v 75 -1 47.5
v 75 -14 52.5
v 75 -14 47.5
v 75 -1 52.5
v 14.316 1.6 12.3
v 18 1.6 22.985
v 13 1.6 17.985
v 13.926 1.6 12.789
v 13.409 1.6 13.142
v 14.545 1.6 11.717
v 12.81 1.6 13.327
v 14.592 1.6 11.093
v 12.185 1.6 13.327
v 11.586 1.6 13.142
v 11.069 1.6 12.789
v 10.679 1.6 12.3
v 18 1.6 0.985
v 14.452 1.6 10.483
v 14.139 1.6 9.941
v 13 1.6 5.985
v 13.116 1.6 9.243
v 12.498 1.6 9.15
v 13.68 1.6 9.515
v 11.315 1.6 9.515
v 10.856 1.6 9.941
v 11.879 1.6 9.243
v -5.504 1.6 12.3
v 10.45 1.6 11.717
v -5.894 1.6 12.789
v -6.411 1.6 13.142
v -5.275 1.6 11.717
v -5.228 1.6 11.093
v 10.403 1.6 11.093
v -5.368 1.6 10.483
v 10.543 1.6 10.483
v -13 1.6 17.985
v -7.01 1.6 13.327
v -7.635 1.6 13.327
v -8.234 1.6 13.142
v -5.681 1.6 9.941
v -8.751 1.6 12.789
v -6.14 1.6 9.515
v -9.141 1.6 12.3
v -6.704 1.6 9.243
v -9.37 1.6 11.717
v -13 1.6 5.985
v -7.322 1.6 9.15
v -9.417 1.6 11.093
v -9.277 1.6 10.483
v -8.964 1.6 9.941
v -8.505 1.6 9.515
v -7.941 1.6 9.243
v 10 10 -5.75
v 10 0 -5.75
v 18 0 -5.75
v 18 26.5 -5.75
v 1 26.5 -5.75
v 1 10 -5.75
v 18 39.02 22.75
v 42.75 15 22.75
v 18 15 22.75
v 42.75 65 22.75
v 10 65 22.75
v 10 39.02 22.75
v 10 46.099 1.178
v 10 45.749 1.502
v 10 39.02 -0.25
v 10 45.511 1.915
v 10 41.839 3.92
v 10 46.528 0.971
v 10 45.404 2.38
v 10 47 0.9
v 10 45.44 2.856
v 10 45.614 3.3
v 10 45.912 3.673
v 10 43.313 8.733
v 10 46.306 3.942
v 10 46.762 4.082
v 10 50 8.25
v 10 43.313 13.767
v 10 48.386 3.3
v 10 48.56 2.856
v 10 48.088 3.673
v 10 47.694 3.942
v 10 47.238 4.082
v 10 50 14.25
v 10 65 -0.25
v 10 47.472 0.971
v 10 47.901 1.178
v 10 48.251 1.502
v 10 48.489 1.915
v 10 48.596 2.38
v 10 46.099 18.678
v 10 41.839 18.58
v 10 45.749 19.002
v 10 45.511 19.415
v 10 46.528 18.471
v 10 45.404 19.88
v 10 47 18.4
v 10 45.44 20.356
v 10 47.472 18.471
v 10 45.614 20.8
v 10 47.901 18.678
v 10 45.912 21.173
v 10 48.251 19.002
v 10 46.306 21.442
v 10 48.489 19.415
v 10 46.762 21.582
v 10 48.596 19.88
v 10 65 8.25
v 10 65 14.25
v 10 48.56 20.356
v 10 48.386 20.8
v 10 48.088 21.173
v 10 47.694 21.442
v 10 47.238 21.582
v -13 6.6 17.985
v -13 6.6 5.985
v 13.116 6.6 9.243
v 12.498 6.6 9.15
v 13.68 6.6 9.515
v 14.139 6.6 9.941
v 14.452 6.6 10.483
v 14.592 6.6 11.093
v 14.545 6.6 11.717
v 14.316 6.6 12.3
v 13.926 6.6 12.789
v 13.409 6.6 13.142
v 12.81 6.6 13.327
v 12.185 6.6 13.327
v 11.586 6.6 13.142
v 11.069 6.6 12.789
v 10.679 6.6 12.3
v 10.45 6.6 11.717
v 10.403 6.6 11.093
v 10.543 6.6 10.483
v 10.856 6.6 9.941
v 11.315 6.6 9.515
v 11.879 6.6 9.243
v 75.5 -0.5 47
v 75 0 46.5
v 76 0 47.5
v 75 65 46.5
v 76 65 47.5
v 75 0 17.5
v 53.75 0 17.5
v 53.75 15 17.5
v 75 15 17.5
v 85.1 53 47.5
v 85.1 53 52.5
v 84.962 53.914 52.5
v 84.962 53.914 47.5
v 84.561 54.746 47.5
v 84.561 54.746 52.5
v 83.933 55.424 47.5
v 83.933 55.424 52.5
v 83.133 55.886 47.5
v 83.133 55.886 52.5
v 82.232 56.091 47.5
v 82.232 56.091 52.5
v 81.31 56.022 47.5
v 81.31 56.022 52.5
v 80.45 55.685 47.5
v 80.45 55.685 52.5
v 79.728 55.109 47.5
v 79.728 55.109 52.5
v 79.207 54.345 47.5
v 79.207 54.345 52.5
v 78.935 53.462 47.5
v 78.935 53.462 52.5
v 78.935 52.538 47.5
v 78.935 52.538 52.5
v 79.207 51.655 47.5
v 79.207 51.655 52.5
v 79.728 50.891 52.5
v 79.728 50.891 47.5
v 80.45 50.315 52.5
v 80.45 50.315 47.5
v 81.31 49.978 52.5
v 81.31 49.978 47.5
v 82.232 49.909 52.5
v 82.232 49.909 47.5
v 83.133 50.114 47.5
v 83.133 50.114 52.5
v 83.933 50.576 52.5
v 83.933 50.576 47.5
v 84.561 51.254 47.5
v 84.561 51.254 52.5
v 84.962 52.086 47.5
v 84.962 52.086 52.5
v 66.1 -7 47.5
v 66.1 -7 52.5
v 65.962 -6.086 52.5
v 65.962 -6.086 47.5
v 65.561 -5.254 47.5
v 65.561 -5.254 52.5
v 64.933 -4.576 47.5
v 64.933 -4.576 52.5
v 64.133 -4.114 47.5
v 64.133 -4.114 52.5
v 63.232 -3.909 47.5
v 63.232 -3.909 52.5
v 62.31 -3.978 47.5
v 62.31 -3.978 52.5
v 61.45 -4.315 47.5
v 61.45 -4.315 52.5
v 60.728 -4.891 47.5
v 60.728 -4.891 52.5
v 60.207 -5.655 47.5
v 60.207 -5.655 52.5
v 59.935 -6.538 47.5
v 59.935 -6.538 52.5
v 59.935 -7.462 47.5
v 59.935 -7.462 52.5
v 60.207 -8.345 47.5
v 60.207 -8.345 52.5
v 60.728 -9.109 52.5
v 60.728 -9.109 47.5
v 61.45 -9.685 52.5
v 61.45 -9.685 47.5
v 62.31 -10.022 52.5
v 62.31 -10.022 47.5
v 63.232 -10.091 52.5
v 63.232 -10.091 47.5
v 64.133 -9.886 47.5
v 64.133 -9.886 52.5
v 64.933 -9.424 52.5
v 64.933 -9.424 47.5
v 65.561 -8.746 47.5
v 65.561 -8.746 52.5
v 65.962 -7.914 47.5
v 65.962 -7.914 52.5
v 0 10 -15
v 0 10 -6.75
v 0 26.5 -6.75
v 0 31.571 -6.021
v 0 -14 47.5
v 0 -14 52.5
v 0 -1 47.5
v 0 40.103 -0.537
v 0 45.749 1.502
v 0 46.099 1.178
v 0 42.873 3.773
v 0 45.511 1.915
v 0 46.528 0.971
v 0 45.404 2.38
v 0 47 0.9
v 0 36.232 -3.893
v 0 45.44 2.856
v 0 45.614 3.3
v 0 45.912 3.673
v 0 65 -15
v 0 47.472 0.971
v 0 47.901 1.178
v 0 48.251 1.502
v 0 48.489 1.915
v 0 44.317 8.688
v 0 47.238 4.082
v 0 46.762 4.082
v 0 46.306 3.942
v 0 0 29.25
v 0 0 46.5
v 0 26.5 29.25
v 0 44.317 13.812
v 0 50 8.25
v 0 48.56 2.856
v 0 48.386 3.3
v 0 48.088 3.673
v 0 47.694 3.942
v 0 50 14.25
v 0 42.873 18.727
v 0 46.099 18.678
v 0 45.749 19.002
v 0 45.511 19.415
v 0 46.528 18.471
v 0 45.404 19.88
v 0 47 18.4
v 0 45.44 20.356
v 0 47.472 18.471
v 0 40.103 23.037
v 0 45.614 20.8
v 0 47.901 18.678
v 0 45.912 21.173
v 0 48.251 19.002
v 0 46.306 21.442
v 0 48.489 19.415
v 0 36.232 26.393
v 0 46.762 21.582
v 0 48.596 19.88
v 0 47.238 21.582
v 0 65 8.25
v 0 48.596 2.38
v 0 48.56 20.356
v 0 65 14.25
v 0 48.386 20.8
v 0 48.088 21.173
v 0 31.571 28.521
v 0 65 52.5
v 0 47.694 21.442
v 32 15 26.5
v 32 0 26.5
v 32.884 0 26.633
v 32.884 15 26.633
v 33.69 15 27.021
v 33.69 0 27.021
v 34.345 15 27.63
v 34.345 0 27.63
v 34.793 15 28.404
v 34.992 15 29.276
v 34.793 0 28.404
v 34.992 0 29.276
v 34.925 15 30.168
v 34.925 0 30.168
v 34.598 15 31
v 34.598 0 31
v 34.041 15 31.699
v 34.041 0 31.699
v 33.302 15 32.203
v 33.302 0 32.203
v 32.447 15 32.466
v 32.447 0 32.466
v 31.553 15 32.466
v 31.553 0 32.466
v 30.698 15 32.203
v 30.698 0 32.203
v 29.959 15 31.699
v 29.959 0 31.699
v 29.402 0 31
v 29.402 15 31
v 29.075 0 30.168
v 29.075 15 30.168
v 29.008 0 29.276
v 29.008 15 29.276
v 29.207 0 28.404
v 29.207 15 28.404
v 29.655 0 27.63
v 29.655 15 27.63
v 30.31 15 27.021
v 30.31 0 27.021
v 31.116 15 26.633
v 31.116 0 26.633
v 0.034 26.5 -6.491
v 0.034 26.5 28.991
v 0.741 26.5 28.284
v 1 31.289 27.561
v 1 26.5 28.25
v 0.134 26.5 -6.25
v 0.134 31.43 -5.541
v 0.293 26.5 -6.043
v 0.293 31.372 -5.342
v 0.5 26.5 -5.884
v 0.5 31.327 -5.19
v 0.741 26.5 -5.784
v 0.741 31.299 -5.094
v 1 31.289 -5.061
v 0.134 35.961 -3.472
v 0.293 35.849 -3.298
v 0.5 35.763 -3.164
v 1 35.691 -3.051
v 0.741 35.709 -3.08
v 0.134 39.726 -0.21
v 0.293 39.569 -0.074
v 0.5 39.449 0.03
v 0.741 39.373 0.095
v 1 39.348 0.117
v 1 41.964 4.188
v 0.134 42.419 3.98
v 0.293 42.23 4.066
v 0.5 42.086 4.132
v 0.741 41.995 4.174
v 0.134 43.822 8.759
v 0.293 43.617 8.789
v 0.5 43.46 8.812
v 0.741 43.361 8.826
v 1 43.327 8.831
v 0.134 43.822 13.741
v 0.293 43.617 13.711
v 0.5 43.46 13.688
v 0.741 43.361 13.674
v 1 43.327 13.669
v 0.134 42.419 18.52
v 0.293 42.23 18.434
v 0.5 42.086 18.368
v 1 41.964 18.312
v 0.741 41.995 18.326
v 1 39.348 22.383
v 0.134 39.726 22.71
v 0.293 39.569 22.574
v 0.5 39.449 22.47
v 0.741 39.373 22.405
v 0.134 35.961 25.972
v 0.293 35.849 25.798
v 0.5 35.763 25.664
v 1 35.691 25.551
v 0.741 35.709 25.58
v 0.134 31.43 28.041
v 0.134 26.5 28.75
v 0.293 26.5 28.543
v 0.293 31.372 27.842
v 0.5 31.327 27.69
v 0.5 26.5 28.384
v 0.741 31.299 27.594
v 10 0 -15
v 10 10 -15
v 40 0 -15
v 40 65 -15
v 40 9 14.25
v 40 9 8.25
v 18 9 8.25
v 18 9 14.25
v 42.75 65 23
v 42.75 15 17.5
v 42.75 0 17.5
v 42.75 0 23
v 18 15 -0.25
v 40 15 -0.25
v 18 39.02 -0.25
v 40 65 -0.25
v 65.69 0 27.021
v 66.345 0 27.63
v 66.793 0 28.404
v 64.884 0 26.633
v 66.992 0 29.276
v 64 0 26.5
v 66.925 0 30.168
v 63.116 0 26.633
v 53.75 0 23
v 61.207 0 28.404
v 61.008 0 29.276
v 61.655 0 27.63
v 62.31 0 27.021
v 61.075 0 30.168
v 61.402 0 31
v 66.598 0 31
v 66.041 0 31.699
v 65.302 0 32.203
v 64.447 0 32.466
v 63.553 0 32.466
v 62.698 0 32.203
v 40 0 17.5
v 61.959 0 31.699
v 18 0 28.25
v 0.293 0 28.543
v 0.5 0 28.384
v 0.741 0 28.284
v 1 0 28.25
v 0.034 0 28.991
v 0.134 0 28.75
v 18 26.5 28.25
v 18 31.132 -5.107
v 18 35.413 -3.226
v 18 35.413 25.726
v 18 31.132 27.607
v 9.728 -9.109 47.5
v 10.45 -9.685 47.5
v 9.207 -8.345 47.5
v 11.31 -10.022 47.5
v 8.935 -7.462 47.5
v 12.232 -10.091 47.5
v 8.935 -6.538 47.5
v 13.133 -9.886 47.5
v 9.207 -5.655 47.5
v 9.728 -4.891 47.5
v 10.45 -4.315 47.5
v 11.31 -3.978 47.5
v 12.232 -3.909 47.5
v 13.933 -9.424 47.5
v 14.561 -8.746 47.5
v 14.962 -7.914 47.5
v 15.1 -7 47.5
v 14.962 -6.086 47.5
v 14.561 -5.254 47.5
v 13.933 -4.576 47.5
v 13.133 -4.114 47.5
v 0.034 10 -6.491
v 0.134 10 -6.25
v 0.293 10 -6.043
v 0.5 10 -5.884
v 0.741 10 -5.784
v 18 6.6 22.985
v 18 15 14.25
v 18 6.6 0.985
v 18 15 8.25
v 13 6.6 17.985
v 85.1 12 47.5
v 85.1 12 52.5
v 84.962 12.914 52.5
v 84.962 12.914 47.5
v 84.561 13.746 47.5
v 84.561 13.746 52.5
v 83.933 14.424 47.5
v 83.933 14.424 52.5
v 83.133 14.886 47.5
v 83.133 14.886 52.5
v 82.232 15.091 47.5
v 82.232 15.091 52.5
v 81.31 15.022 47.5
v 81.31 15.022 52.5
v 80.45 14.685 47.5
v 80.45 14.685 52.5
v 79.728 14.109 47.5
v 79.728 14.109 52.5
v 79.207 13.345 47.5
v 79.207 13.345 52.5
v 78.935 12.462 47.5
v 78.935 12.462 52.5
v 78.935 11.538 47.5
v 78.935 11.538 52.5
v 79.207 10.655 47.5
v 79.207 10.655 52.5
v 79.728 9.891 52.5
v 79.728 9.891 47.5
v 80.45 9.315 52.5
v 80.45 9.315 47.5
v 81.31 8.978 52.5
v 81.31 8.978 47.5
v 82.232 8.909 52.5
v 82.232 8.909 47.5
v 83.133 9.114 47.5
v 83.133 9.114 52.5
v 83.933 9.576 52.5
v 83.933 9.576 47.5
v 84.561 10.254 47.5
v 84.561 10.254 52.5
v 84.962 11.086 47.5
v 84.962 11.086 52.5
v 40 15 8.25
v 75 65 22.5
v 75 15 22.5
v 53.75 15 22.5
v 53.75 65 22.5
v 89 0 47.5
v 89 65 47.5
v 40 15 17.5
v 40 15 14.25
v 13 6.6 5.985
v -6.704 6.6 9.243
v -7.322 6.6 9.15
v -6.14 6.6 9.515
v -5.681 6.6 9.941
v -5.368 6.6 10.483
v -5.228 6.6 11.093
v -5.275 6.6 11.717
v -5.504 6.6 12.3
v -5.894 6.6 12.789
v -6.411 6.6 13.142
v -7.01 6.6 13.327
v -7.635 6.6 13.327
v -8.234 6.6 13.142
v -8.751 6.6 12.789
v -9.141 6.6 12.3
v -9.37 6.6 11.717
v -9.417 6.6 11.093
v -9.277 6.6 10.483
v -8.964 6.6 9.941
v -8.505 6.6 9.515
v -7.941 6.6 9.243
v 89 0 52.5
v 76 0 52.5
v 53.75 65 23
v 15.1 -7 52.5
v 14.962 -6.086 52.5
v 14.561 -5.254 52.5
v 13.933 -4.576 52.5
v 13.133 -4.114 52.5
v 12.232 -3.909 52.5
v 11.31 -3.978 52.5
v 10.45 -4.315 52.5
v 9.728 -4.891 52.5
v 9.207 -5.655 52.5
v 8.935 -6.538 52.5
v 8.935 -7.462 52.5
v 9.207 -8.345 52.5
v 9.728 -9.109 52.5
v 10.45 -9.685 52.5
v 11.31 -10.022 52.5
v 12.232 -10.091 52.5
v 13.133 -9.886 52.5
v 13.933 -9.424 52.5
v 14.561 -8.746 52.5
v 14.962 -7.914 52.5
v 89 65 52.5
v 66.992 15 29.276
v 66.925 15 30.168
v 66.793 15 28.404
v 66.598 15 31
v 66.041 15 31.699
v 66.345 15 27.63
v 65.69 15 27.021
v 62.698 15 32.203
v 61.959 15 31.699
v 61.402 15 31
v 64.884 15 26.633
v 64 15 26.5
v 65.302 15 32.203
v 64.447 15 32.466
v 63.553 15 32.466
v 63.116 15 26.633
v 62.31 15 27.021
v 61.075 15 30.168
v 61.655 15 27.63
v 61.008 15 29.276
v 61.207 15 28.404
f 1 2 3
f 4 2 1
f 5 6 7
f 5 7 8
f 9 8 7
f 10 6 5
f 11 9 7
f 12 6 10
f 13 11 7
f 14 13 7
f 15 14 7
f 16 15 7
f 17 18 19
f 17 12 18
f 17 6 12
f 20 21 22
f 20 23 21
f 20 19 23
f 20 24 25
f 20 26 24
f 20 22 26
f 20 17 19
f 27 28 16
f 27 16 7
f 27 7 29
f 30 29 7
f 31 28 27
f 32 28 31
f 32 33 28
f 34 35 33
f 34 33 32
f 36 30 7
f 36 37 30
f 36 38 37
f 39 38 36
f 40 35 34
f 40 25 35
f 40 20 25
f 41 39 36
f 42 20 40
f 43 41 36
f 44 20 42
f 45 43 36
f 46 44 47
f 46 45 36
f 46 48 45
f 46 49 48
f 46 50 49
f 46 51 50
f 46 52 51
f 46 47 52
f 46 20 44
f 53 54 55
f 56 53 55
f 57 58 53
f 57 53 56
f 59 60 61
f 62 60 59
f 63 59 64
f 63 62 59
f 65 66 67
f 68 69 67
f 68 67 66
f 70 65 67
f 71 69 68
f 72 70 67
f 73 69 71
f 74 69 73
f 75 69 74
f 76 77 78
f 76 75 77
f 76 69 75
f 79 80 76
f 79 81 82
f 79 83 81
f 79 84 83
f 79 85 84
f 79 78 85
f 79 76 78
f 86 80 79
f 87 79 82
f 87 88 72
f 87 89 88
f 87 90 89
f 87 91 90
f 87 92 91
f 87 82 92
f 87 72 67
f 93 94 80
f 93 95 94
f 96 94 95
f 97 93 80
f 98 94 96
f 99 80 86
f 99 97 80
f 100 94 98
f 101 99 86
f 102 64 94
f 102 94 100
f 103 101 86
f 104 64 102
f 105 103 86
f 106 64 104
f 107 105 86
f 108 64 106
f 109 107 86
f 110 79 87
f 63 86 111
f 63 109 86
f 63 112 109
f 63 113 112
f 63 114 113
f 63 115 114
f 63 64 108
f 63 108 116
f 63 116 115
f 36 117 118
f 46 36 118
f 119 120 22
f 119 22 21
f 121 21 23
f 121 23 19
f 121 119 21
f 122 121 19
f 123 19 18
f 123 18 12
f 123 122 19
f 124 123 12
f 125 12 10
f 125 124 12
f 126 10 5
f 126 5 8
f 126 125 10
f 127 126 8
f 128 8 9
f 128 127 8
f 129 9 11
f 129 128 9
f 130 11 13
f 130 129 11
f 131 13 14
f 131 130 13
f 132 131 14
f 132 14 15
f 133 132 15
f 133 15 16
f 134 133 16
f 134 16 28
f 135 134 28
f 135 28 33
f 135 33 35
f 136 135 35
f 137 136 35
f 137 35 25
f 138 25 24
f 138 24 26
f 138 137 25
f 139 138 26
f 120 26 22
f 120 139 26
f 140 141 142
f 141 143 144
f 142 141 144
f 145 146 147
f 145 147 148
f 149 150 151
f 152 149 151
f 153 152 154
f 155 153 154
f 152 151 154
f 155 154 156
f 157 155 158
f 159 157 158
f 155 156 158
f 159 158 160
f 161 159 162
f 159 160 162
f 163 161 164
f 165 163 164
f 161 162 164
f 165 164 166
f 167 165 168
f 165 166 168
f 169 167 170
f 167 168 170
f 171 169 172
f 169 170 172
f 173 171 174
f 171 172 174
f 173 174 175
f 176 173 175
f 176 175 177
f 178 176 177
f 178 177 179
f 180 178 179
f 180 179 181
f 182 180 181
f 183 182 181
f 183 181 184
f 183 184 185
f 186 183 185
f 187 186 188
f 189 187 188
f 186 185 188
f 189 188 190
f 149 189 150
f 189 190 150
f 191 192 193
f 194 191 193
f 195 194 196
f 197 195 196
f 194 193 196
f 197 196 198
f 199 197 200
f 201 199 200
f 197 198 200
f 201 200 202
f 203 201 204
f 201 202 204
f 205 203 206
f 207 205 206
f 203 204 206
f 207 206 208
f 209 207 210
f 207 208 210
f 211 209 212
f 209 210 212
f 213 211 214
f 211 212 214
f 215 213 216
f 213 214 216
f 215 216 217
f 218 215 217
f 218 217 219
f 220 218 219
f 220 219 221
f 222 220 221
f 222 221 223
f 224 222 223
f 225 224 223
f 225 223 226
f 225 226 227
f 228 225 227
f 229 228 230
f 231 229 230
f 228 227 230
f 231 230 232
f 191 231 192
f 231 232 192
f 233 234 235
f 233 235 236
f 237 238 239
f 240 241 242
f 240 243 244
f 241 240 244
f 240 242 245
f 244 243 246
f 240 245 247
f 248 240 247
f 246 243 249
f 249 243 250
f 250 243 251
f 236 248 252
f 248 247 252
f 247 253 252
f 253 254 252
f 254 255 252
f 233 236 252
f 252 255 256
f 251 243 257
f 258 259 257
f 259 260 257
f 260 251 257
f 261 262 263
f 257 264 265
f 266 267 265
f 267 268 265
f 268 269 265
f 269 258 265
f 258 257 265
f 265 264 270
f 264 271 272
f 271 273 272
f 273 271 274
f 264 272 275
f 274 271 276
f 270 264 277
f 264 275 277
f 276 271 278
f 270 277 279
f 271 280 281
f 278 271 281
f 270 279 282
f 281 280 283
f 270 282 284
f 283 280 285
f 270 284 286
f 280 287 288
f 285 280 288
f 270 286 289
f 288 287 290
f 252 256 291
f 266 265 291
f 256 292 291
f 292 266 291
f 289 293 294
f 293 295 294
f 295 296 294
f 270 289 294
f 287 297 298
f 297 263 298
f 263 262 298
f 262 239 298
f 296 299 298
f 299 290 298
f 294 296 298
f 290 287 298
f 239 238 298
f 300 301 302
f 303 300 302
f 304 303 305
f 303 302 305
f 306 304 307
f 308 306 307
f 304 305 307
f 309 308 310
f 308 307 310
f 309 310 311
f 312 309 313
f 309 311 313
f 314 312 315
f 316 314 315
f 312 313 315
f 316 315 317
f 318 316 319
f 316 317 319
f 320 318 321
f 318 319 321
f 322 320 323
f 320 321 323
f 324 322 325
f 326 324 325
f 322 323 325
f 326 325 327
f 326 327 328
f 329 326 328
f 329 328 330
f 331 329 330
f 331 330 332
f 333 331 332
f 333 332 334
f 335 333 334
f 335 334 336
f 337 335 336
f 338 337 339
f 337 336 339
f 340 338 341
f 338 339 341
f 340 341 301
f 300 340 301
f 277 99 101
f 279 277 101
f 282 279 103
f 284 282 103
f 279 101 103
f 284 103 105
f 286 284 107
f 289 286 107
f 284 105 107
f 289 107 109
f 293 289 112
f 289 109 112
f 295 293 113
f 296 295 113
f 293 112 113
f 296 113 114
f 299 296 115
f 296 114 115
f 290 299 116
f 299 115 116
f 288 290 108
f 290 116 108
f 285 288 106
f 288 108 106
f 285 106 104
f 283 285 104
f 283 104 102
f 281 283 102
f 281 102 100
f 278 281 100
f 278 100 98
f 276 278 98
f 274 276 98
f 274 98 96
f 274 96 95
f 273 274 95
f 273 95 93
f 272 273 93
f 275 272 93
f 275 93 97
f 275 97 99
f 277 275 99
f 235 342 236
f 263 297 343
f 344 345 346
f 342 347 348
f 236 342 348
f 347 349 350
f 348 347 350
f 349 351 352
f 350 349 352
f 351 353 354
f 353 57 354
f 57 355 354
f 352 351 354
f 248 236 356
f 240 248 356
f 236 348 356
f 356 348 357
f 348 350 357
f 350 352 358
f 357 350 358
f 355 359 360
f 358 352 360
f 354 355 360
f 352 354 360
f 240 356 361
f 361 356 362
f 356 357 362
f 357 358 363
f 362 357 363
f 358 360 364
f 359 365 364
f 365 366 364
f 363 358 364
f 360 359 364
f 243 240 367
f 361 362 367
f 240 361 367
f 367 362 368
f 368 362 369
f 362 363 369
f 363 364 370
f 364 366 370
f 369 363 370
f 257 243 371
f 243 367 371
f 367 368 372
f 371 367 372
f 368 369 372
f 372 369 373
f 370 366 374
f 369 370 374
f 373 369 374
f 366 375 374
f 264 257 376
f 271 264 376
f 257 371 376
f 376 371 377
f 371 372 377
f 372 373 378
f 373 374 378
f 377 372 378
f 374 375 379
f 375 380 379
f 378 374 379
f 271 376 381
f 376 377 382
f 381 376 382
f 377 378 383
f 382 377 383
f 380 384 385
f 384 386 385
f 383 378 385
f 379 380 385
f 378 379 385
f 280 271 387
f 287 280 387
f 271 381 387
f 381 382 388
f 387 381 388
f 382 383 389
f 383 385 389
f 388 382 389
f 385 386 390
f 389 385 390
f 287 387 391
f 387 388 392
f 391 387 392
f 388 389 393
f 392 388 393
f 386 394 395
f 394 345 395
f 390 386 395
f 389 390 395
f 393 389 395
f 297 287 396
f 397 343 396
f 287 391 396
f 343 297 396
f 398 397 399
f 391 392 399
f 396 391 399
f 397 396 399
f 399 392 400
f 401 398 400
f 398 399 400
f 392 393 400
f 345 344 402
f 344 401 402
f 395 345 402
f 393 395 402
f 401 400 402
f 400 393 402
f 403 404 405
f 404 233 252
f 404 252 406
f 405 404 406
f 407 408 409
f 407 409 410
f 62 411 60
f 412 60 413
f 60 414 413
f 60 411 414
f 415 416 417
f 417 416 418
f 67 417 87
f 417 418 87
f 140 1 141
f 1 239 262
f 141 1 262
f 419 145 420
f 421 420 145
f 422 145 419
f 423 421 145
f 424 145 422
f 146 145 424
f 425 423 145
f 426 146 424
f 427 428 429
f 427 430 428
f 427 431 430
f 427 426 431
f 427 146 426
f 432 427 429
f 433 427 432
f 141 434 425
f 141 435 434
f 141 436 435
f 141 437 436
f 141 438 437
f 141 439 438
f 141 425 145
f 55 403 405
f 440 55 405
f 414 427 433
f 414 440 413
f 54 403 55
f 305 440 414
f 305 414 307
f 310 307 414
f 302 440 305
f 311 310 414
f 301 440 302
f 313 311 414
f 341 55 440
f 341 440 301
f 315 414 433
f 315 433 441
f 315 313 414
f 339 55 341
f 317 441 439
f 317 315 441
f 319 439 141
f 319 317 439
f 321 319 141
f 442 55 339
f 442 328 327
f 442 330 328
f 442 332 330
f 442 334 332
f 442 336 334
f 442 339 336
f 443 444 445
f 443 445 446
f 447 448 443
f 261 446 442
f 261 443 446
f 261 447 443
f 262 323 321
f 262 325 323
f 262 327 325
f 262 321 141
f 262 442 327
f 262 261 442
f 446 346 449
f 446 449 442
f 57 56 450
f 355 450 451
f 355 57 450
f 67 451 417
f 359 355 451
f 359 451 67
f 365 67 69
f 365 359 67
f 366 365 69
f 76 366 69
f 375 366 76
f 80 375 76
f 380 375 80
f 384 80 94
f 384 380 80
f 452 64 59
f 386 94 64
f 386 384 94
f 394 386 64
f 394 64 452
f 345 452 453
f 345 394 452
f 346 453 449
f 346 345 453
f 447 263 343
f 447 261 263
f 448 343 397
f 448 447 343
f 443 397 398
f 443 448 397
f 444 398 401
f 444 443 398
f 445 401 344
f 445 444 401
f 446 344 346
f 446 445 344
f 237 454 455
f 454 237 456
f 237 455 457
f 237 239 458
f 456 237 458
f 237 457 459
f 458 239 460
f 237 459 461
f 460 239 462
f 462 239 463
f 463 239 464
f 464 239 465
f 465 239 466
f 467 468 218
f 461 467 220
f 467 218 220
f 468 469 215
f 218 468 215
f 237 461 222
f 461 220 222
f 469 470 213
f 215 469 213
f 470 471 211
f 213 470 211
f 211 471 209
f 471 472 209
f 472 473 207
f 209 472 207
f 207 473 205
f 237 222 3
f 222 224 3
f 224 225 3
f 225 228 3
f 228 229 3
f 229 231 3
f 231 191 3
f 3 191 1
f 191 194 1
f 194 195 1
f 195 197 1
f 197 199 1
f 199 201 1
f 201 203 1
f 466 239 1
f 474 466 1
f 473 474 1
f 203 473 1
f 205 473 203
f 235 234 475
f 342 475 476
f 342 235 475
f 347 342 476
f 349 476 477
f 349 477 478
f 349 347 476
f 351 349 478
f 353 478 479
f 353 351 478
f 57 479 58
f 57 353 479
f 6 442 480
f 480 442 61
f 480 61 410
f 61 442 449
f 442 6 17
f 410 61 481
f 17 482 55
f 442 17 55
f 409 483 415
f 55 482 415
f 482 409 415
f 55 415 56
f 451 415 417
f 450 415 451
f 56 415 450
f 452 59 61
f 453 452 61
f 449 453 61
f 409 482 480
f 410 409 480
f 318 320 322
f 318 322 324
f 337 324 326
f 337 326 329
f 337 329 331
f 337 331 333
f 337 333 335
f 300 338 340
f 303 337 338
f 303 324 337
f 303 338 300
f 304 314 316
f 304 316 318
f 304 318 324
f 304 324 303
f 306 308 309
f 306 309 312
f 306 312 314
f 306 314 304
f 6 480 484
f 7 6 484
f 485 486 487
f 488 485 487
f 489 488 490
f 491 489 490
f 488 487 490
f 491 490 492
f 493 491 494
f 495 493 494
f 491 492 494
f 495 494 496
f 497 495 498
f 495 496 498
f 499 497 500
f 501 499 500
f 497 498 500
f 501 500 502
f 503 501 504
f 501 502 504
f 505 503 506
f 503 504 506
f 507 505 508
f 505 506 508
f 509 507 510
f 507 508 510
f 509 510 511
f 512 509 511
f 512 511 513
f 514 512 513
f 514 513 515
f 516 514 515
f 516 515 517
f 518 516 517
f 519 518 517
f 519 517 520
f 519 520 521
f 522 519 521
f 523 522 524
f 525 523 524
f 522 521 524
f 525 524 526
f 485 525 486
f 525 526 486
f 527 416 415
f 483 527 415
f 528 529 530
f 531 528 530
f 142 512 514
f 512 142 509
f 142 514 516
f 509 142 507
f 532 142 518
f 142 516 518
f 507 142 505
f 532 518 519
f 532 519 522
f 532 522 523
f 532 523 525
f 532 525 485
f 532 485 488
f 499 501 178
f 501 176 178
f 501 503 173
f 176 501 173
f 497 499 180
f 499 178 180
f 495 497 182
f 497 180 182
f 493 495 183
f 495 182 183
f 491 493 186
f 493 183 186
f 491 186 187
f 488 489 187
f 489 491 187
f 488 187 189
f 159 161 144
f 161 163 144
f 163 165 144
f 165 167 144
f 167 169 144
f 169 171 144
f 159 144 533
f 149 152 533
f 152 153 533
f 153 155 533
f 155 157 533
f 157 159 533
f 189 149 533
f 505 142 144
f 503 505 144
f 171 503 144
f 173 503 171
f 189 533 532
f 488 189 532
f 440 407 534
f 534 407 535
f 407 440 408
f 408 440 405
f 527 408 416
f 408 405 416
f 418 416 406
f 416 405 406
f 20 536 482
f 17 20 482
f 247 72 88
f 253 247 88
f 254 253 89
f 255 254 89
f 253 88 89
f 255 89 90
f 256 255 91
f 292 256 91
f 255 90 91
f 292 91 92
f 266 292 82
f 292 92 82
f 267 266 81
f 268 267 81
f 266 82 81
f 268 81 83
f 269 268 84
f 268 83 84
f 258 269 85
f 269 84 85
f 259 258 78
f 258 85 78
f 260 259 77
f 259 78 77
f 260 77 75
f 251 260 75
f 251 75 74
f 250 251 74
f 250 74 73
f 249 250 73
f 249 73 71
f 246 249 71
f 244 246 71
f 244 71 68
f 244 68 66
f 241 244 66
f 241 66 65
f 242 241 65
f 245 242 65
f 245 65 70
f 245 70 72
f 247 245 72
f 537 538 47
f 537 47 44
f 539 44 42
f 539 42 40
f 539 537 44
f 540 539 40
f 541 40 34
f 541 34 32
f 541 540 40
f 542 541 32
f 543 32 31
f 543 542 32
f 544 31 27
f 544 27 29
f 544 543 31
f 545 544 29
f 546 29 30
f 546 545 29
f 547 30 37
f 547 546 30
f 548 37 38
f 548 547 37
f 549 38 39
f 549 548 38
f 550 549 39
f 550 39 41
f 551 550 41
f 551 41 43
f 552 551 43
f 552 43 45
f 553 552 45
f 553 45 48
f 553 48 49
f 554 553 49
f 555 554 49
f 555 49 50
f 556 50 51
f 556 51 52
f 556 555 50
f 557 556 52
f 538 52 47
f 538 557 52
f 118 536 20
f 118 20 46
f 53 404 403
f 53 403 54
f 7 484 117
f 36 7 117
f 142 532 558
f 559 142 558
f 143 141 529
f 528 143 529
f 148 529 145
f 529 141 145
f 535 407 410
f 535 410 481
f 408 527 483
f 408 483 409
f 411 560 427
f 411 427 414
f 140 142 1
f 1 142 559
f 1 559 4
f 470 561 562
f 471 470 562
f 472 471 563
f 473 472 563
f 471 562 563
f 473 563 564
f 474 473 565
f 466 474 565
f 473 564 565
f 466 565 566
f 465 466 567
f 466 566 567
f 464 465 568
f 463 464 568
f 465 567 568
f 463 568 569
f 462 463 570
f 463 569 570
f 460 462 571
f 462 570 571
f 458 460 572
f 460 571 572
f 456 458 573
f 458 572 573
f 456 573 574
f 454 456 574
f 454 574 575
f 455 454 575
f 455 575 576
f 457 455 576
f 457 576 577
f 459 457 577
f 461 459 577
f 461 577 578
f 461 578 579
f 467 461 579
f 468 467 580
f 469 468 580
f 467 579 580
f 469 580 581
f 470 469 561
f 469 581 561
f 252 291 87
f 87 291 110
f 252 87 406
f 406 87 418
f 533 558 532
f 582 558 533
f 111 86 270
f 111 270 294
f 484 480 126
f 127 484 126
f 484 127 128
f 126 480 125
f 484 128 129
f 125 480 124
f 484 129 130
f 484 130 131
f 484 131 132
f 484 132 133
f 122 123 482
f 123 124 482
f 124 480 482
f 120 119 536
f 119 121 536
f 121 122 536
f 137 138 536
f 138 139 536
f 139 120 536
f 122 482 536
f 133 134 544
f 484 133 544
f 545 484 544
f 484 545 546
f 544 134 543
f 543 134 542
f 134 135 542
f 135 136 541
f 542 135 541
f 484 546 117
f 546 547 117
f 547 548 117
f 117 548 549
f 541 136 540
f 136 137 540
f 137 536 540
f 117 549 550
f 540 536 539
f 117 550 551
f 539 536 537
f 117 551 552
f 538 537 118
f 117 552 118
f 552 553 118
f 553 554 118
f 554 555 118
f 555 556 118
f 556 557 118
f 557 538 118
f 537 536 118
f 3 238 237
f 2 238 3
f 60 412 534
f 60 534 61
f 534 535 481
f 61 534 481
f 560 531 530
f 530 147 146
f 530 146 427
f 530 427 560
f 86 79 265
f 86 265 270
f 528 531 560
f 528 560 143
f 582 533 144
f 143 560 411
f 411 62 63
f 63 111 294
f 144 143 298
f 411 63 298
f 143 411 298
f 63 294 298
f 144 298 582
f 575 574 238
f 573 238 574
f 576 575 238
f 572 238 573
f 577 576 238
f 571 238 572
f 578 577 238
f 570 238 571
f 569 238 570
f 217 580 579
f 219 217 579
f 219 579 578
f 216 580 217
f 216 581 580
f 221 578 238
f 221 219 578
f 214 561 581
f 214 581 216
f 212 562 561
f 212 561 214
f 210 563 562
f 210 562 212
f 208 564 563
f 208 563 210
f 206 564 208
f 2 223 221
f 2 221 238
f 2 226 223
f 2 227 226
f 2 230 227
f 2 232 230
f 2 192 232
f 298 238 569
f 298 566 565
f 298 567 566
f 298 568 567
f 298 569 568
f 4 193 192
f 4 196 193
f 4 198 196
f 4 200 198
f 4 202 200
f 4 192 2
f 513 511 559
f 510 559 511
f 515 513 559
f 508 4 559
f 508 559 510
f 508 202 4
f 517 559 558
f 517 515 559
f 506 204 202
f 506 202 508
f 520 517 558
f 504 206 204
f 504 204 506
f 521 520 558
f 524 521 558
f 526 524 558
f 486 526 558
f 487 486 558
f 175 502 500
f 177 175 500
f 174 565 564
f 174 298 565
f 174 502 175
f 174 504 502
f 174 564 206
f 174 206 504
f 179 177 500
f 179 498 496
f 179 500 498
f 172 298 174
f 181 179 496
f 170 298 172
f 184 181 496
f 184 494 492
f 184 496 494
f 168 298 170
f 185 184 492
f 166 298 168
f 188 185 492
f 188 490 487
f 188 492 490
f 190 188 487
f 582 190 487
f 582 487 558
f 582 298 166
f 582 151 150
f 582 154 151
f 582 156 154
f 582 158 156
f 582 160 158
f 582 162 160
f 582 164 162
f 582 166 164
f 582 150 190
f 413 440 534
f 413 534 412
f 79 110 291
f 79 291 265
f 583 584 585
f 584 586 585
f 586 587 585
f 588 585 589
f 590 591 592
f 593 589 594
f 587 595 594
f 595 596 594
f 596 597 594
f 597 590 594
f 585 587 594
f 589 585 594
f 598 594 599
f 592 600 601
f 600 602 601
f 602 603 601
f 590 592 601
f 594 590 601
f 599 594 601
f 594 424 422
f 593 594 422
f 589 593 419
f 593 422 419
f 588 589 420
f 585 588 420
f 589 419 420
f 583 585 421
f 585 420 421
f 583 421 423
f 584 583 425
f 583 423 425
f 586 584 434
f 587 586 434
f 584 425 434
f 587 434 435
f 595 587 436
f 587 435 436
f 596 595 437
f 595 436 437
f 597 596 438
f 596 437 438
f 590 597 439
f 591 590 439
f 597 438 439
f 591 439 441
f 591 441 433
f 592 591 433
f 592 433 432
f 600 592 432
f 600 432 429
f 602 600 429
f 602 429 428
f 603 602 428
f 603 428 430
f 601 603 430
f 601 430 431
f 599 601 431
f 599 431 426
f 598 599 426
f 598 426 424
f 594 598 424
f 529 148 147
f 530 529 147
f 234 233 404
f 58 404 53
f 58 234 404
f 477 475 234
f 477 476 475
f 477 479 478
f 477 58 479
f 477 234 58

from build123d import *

# Parameters (mm, degrees)
BOSS_EXTRUDE1_DEPTH      = 42.5
BOSS_EXTRUDE1_DEPTH_BACK = 15
SKETCH1_W                = 40
SKETCH1_H                = 65
SKETCH3_W                = 22.5
SKETCH3_H                = 50
CUT_EXTRUDE2_DEPTH       = 30
SKETCH4_R                = 4.5
CUT_EXTRUDE3_DEPTH       = 10
SKETCH5_W                = 35
SKETCH5_H                = 25
BOSS_EXTRUDE3_DEPTH      = 15
SKETCH6_R                = 3
CUT_EXTRUDE4_DEPTH       = 15
CUT_EXTRUDE5_DEPTH       = 108.964114408
BOSS_EXTRUDE4_DEPTH      = 10
BOSS_EXTRUDE5_OUTLINE_R  = 3
BOSS_EXTRUDE5_DEPTH      = 50
BOSS_EXTRUDE6_START      = -50
SKETCH11_R               = 3
BOSS_EXTRUDE6_DEPTH      = 50
SKETCH12_W               = 14
SKETCH12_H               = 65
SKETCH12_R               = 3.1
SKETCH12_W_2             = 75
SKETCH12_H_2             = 14
BOSS_EXTRUDE7_DEPTH      = 5
SKETCH13_R               = 1.6
CUT_EXTRUDE6_DEPTH       = 115.988042857
CUT_EXTRUDE7_DEPTH       = 11.5
CUT_EXTRUDE7_DEPTH_BACK  = 11.5
SKETCH14_W               = 43.75
SKETCH14_H               = 50
CUT_EXTRUDE8_DEPTH       = 30
CUT_EXTRUDE9_DEPTH       = 115.988042857
CUT_EXTRUDE10_DEPTH      = 18
SKETCH18_W               = 31
SKETCH18_H               = 12
SKETCH18_R               = 2.1
BOSS_EXTRUDE8_DEPTH      = 5
FILLET2_R                = 1
SKETCH19_W               = 9.25
SKETCH19_H               = 10
CUT_EXTRUDE11_DEPTH      = 10
CHAMFER1_SIZE            = 1
CHAMFER2_SIZE            = 1


# Read off the part's stored shape, not the designer's step: Boss-Extrude5
# Some blends are built 0.0001 mm under size
with BuildPart() as part:
    # Sketch1 → Boss-Extrude1 (new, two sides: drawn at the far end of the back side and taken through both)
    with BuildSketch(Plane.XY.offset(-BOSS_EXTRUDE1_DEPTH_BACK)):
        with Locations((20, 32.5)):
            Rectangle(SKETCH1_W, SKETCH1_H)
    extrude(amount=BOSS_EXTRUDE1_DEPTH + BOSS_EXTRUDE1_DEPTH_BACK)

    # Sketch3 → Cut-Extrude2 (cut)
    with BuildSketch(Plane(origin=(40, 0, 0), x_dir=(0, 0, -1), z_dir=(1, 0, 0))):
        with Locations((-11.25, 40)):
            Rectangle(SKETCH3_W, SKETCH3_H)
    extrude(amount=-CUT_EXTRUDE2_DEPTH, mode=Mode.SUBTRACT)

    # Sketch4 → Cut-Extrude3 (cut)
    with BuildSketch(Plane(origin=(10, 0, 0), x_dir=(0, 0, -1), z_dir=(1, 0, 0))):
        with Locations((-11.25, 26.5)):
            Circle(SKETCH4_R)
    extrude(amount=-CUT_EXTRUDE3_DEPTH, mode=Mode.SUBTRACT)

    # Sketch5 → Boss-Extrude3 (add)
    with BuildSketch(Plane.XZ):
        with Locations((57.5, 30)):
            Rectangle(SKETCH5_W, SKETCH5_H)
    extrude(amount=-BOSS_EXTRUDE3_DEPTH)

    # Sketch6 → Cut-Extrude4 (cut)
    with BuildSketch(Plane.XZ):
        with Locations(Location((32, 29.5, 0), (0, 0, 270))):
            Circle(SKETCH6_R)
        with Locations(Location((64, 29.5, 0), (0, 0, 270))):
            Circle(SKETCH6_R)
    extrude(amount=-CUT_EXTRUDE4_DEPTH, mode=Mode.SUBTRACT)

    # Sketch8 → Cut-Extrude5 (cut, through all)
    with BuildSketch(Plane.XZ):
        Polygon((48.25, 17.5), (42.75, 17.5), (42.75, 23), (53.75, 23), (53.75, 17.5), align=None)
    extrude(amount=-CUT_EXTRUDE5_DEPTH, mode=Mode.SUBTRACT)

    # Sketch9 → Boss-Extrude4 (add)
    with BuildSketch(Plane.XY.offset(42.5)):
        Polygon((0, 65), (0, 0), (75, 0), (75, 15), (40, 15), (40, 65), align=None)
    extrude(amount=BOSS_EXTRUDE4_DEPTH)

    # Boss-Extrude5 outline → Boss-Extrude5 (add)
    with BuildSketch(Plane(origin=(0, 15, 0), x_dir=(1, 0, 0), z_dir=(0, 1, 0))):
        Polygon((75, -52.5), (75, -22.5), (53.75, -22.5), (53.75, -23), (42.75, -23), (42.75, -22.5), (40, -22.5), (40, -52.5), align=None)
        with Locations((64, -29.5)):
            Circle(BOSS_EXTRUDE5_OUTLINE_R, mode=Mode.SUBTRACT)
    extrude(amount=BOSS_EXTRUDE5_DEPTH)

    # Sketch11 → Boss-Extrude6 (add)
    with BuildSketch(Plane(origin=(0, 65, 0), x_dir=(1, 0, 0), z_dir=(0, 1, 0)).offset(BOSS_EXTRUDE6_START)):
        with Locations(Location((64, -29.5, 0), (0, 0, 90))):
            Circle(SKETCH11_R)
    extrude(amount=BOSS_EXTRUDE6_DEPTH)

    # Sketch12 → Boss-Extrude7 (add)
    # profile 1 of 2: a face of its own
    with BuildSketch(Plane.XY.offset(52.5)):
        with Locations((82, 32.5)):
            Rectangle(SKETCH12_W, SKETCH12_H)
        with Locations((82, 53)):
            Circle(SKETCH12_R, mode=Mode.SUBTRACT)
        with Locations((82, 12)):
            Circle(SKETCH12_R, mode=Mode.SUBTRACT)
    # profile 2 of 2: a face of its own
    with BuildSketch(Plane.XY.offset(52.5)):
        with Locations((37.5, -7)):
            Rectangle(SKETCH12_W_2, SKETCH12_H_2)
        with Locations((12, -7)):
            Circle(SKETCH12_R, mode=Mode.SUBTRACT)
        with Locations((63, -7)):
            Circle(SKETCH12_R, mode=Mode.SUBTRACT)
    extrude(amount=-BOSS_EXTRUDE7_DEPTH)

    # Sketch13 → Cut-Extrude6 (cut, through all)
    with BuildSketch(Plane(origin=(10, 0, 0), x_dir=(0, 0, -1), z_dir=(1, 0, 0))):
        with Locations((-2.5, 47)):
            Circle(SKETCH13_R)
        with Locations((-20, 47)):
            Circle(SKETCH13_R)
    extrude(amount=-CUT_EXTRUDE6_DEPTH, mode=Mode.SUBTRACT)

    # Sketch14 → Cut-Extrude7 (cut, two sides: drawn at the far end of the back side and taken through both)
    with BuildSketch(Plane(origin=(0, 0, 11.25), x_dir=(-1, 0, 0), z_dir=(0, 0, -1)).offset(-CUT_EXTRUDE7_DEPTH_BACK)):
        with Locations((-31.875, 40)):
            Rectangle(SKETCH14_W, SKETCH14_H)
    extrude(amount=CUT_EXTRUDE7_DEPTH + CUT_EXTRUDE7_DEPTH_BACK, mode=Mode.SUBTRACT)

    # Sketch15 → Cut-Extrude8 (cut)
    with BuildSketch(Plane(origin=(40, 0, 0), x_dir=(0, 0, -1), z_dir=(1, 0, 0))):
        Polygon((-11.25, 15), (-8.25, 15), (-8.25, 9), (-14.25, 9), (-14.25, 15), align=None)
    extrude(amount=-CUT_EXTRUDE8_DEPTH, mode=Mode.SUBTRACT)

    # Sketch16 → Cut-Extrude9 (cut, through all)
    with BuildSketch(Plane(origin=(10, 0, 0), x_dir=(0, 0, -1), z_dir=(1, 0, 0))):
        Polygon((-11.25, 65), (-8.25, 65), (-8.25, 50), (-14.25, 50), (-14.25, 65), align=None)
    extrude(amount=-CUT_EXTRUDE9_DEPTH, mode=Mode.SUBTRACT)

    # Sketch17 → Cut-Extrude10 (cut)
    with BuildSketch(Plane.ZY):
        with BuildLine():
            Line((28.25, 26.5), (28.25, 0))
            Line((28.25, 0), (-5.75, 0))
            Line((-5.75, 0), (-5.75, 26.5))
            ThreePointArc((-5.75, 26.5), (11.25, 43.5), (28.25, 26.5))
        make_face()
    extrude(amount=-CUT_EXTRUDE10_DEPTH, mode=Mode.SUBTRACT)

    # Sketch18 → Boss-Extrude8 (add)
    # profile 1 of 3: a face of its own
    with BuildSketch(Plane(origin=(78.326188017, 6.6, -27.619079409), x_dir=(-1, 0, 0), z_dir=(0, -1, 0))):
        Polygon((60.326188017, -28.604062705), (60.326188017, -33.604062705), (65.326188017, -33.604062705), align=None)
    # profile 2 of 3: a face of its own
    with BuildSketch(Plane(origin=(78.326188017, 6.6, -27.619079409), x_dir=(-1, 0, 0), z_dir=(0, -1, 0))):
        Polygon((65.326188017, -45.604062705), (60.326188017, -45.604062705), (60.326188017, -50.604062705), align=None)
    # profile 3 of 3: a face of its own
    with BuildSketch(Plane(origin=(78.326188017, 6.6, -27.619079409), x_dir=(-1, 0, 0), z_dir=(0, -1, 0))):
        with Locations((75.826188017, -39.604062705)):
            Rectangle(SKETCH18_W, SKETCH18_H)
        with Locations(Location((85.648688017, -38.869079409, 0), (0, 0, 90))):
            Circle(SKETCH18_R, mode=Mode.SUBTRACT)
        with Locations(Location((65.828688017, -38.869079409, 0), (0, 0, 90))):
            Circle(SKETCH18_R, mode=Mode.SUBTRACT)
    extrude(amount=BOSS_EXTRUDE8_DEPTH)

    # Fillet2
    fillet2_edges = [part.edges().sort_by_distance(p)[0] for p in [
        (0, 43.5, 11.25),
        (0, 13.25, -5.75),
        (0, 13.25, 28.25),
    ]]
    fillet(fillet2_edges, radius=FILLET2_R)

    # Sketch19 → Cut-Extrude11 (cut)
    with BuildSketch(Plane.ZY):
        with Locations((-10.375, 5)):
            Rectangle(SKETCH19_W, SKETCH19_H)
    extrude(amount=-CUT_EXTRUDE11_DEPTH, mode=Mode.SUBTRACT)

    # Chamfer1
    # the kernel refuses this chamfer: 1 mm, written as the material it adds along each edge
    with BuildSketch(Plane(origin=(75, 0, 47.5), x_dir=(-0.027495876610582105, 0, -0.999621916911297), z_dir=(0, 1, 0))) as chamfer1_piece_1:
        Polygon((CHAMFER1_SIZE * 0.999621916911, -CHAMFER1_SIZE * 0.0274958766106), (-CHAMFER1_SIZE * 0.0274958766106, -CHAMFER1_SIZE * 0.999621916911), (0, 0), align=None)
    extrude(amount=65)

    # Chamfer2
    chamfer2_edges = [part.edges().sort_by_distance(p)[0] for p in [
        (37.5, 0, 47.5),
    ]]
    chamfer(chamfer2_edges, length=CHAMFER2_SIZE - 0.0001)  # a hair under: the kernel refuses the full size

    # Chamfer3
    # the kernel refuses this chamfer: 1 mm, written as the material it adds along each edge
    with BuildSketch(Plane(origin=(75, 0, 52.5), x_dir=(0.9996219169112968, 0.02749587661058591, 0), z_dir=(0, 0, -1))) as chamfer3_piece_1_section:
        with BuildLine():
            Line((1.028673195, 0), (-0.056547155, 1.027117794))
            Line((-0.056547155, 1.027117794), (-0.076539593, 1.026567876))
            ThreePointArc((-0.076539593, 1.026567876), (-0.034129227, 0.51339783), (-0.019992438, -0.000549918))
            Line((-0.019992438, -0.000549918), (0.000549918, -0.019992438))
            ThreePointArc((0.000549918, -0.019992438), (0.514497665, -0.00585565), (1.029223113, -0.019992438))
            Line((1.029223113, -0.019992438), (1.028673195, 0))
        make_face()
    chamfer3_piece_1 = extrude(amount=8.571582988, mode=Mode.PRIVATE)
    chamfer3_piece_1 = split(chamfer3_piece_1, bisect_by=Plane(origin=(75.329792283, -0.329792248, 47.5), z_dir=(0, 0, 1)), keep=Keep.TOP, mode=Mode.PRIVATE)
    add(chamfer3_piece_1)
    with BuildSketch(Plane(origin=(75, 0, 52.5), x_dir=(0.9996219169112968, 0.02749587661058591, 0), z_dir=(0, 0, -1))) as chamfer3_piece_2_section:
        with BuildLine():
            Line((1.028673195, 0), (-0.056547155, 1.027117794))
            Line((-0.056547155, 1.027117794), (-0.076539593, 1.026567876))
            ThreePointArc((-0.076539593, 1.026567876), (-0.034129227, 0.51339783), (-0.019992438, -0.000549918))
            Line((-0.019992438, -0.000549918), (0.000549918, -0.019992438))
            ThreePointArc((0.000549918, -0.019992438), (0.514497665, -0.00585565), (1.029223113, -0.019992438))
            Line((1.029223113, -0.019992438), (1.028673195, 0))
        make_face()
    chamfer3_piece_2 = extrude(amount=8.571582988, mode=Mode.PRIVATE)
    chamfer3_piece_2 = split(chamfer3_piece_2, bisect_by=Plane(origin=(74.967608751, -1.017389606, 47.5), z_dir=(0, 0, 1)), keep=Keep.TOP, mode=Mode.PRIVATE)
    chamfer3_piece_2 = split(chamfer3_piece_2, bisect_by=Plane(origin=(74.967608751, -1.013017205, 47.513117205), z_dir=(0, -0.7071067811865464, -0.7071067811865488)), keep=Keep.TOP, mode=Mode.PRIVATE)
    add(chamfer3_piece_2)
    with BuildSketch(Plane(origin=(75, 0, 52.5), x_dir=(0.9996219169112968, 0.02749587661058591, 0), z_dir=(0, 0, -1))) as chamfer3_piece_3_section:
        with BuildLine():
            Line((1.028673195, 0), (-0.056547155, 1.027117794))
            Line((-0.056547155, 1.027117794), (-0.076539593, 1.026567876))
            ThreePointArc((-0.076539593, 1.026567876), (-0.034129227, 0.51339783), (-0.019992438, -0.000549918))
            Line((-0.019992438, -0.000549918), (0.000549918, -0.019992438))
            ThreePointArc((0.000549918, -0.019992438), (0.514497665, -0.00585565), (1.029223113, -0.019992438))
            Line((1.029223113, -0.019992438), (1.028673195, 0))
        make_face()
    chamfer3_piece_3 = extrude(amount=8.571582988, mode=Mode.PRIVATE)
    chamfer3_piece_3 = split(chamfer3_piece_3, bisect_by=Plane(origin=(75.495112372, -0.283467256, 46.995112372), z_dir=(-0.7071067811862649, 0, 0.7071067811868302)), keep=Keep.TOP, mode=Mode.PRIVATE)
    chamfer3_piece_3 = split(chamfer3_piece_3, bisect_by=Plane(origin=(75.283503511, -0.283467256, 47.5), z_dir=(0, 0, -1)), keep=Keep.TOP, mode=Mode.PRIVATE)
    chamfer3_piece_3 = split(chamfer3_piece_3, bisect_by=Plane(origin=(75.283503511, -0.495044244, 46.995144244), z_dir=(0, 0.7071067811865464, 0.7071067811865488)), keep=Keep.TOP, mode=Mode.PRIVATE)
    add(chamfer3_piece_3)
    with BuildSketch(Plane(origin=(75, 0, 52.5), x_dir=(0.9996219169112968, 0.02749587661058591, 0), z_dir=(0, 0, -1))) as chamfer3_piece_4_section:
        with BuildLine():
            Line((1.028673195, 0), (-0.056547155, 1.027117794))
            Line((-0.056547155, 1.027117794), (-0.076539593, 1.026567876))
            ThreePointArc((-0.076539593, 1.026567876), (-0.034129227, 0.51339783), (-0.019992438, -0.000549918))
            Line((-0.019992438, -0.000549918), (0.000549918, -0.019992438))
            ThreePointArc((0.000549918, -0.019992438), (0.514497665, -0.00585565), (1.029223113, -0.019992438))
            Line((1.029223113, -0.019992438), (1.028673195, 0))
        make_face()
    chamfer3_piece_4 = extrude(amount=8.571582988, mode=Mode.PRIVATE)
    chamfer3_piece_4 = split(chamfer3_piece_4, bisect_by=Plane(origin=(76.01307363, 0.032413897, 47.51307363), z_dir=(0.7071067811862649, 0, -0.7071067811868302)), keep=Keep.TOP, mode=Mode.PRIVATE)
    chamfer3_piece_4 = split(chamfer3_piece_4, bisect_by=Plane(origin=(76.017431506, 0.032413897, 47.5), z_dir=(0, 0, 1)), keep=Keep.TOP, mode=Mode.PRIVATE)
    add(chamfer3_piece_4)


solid = part.part
